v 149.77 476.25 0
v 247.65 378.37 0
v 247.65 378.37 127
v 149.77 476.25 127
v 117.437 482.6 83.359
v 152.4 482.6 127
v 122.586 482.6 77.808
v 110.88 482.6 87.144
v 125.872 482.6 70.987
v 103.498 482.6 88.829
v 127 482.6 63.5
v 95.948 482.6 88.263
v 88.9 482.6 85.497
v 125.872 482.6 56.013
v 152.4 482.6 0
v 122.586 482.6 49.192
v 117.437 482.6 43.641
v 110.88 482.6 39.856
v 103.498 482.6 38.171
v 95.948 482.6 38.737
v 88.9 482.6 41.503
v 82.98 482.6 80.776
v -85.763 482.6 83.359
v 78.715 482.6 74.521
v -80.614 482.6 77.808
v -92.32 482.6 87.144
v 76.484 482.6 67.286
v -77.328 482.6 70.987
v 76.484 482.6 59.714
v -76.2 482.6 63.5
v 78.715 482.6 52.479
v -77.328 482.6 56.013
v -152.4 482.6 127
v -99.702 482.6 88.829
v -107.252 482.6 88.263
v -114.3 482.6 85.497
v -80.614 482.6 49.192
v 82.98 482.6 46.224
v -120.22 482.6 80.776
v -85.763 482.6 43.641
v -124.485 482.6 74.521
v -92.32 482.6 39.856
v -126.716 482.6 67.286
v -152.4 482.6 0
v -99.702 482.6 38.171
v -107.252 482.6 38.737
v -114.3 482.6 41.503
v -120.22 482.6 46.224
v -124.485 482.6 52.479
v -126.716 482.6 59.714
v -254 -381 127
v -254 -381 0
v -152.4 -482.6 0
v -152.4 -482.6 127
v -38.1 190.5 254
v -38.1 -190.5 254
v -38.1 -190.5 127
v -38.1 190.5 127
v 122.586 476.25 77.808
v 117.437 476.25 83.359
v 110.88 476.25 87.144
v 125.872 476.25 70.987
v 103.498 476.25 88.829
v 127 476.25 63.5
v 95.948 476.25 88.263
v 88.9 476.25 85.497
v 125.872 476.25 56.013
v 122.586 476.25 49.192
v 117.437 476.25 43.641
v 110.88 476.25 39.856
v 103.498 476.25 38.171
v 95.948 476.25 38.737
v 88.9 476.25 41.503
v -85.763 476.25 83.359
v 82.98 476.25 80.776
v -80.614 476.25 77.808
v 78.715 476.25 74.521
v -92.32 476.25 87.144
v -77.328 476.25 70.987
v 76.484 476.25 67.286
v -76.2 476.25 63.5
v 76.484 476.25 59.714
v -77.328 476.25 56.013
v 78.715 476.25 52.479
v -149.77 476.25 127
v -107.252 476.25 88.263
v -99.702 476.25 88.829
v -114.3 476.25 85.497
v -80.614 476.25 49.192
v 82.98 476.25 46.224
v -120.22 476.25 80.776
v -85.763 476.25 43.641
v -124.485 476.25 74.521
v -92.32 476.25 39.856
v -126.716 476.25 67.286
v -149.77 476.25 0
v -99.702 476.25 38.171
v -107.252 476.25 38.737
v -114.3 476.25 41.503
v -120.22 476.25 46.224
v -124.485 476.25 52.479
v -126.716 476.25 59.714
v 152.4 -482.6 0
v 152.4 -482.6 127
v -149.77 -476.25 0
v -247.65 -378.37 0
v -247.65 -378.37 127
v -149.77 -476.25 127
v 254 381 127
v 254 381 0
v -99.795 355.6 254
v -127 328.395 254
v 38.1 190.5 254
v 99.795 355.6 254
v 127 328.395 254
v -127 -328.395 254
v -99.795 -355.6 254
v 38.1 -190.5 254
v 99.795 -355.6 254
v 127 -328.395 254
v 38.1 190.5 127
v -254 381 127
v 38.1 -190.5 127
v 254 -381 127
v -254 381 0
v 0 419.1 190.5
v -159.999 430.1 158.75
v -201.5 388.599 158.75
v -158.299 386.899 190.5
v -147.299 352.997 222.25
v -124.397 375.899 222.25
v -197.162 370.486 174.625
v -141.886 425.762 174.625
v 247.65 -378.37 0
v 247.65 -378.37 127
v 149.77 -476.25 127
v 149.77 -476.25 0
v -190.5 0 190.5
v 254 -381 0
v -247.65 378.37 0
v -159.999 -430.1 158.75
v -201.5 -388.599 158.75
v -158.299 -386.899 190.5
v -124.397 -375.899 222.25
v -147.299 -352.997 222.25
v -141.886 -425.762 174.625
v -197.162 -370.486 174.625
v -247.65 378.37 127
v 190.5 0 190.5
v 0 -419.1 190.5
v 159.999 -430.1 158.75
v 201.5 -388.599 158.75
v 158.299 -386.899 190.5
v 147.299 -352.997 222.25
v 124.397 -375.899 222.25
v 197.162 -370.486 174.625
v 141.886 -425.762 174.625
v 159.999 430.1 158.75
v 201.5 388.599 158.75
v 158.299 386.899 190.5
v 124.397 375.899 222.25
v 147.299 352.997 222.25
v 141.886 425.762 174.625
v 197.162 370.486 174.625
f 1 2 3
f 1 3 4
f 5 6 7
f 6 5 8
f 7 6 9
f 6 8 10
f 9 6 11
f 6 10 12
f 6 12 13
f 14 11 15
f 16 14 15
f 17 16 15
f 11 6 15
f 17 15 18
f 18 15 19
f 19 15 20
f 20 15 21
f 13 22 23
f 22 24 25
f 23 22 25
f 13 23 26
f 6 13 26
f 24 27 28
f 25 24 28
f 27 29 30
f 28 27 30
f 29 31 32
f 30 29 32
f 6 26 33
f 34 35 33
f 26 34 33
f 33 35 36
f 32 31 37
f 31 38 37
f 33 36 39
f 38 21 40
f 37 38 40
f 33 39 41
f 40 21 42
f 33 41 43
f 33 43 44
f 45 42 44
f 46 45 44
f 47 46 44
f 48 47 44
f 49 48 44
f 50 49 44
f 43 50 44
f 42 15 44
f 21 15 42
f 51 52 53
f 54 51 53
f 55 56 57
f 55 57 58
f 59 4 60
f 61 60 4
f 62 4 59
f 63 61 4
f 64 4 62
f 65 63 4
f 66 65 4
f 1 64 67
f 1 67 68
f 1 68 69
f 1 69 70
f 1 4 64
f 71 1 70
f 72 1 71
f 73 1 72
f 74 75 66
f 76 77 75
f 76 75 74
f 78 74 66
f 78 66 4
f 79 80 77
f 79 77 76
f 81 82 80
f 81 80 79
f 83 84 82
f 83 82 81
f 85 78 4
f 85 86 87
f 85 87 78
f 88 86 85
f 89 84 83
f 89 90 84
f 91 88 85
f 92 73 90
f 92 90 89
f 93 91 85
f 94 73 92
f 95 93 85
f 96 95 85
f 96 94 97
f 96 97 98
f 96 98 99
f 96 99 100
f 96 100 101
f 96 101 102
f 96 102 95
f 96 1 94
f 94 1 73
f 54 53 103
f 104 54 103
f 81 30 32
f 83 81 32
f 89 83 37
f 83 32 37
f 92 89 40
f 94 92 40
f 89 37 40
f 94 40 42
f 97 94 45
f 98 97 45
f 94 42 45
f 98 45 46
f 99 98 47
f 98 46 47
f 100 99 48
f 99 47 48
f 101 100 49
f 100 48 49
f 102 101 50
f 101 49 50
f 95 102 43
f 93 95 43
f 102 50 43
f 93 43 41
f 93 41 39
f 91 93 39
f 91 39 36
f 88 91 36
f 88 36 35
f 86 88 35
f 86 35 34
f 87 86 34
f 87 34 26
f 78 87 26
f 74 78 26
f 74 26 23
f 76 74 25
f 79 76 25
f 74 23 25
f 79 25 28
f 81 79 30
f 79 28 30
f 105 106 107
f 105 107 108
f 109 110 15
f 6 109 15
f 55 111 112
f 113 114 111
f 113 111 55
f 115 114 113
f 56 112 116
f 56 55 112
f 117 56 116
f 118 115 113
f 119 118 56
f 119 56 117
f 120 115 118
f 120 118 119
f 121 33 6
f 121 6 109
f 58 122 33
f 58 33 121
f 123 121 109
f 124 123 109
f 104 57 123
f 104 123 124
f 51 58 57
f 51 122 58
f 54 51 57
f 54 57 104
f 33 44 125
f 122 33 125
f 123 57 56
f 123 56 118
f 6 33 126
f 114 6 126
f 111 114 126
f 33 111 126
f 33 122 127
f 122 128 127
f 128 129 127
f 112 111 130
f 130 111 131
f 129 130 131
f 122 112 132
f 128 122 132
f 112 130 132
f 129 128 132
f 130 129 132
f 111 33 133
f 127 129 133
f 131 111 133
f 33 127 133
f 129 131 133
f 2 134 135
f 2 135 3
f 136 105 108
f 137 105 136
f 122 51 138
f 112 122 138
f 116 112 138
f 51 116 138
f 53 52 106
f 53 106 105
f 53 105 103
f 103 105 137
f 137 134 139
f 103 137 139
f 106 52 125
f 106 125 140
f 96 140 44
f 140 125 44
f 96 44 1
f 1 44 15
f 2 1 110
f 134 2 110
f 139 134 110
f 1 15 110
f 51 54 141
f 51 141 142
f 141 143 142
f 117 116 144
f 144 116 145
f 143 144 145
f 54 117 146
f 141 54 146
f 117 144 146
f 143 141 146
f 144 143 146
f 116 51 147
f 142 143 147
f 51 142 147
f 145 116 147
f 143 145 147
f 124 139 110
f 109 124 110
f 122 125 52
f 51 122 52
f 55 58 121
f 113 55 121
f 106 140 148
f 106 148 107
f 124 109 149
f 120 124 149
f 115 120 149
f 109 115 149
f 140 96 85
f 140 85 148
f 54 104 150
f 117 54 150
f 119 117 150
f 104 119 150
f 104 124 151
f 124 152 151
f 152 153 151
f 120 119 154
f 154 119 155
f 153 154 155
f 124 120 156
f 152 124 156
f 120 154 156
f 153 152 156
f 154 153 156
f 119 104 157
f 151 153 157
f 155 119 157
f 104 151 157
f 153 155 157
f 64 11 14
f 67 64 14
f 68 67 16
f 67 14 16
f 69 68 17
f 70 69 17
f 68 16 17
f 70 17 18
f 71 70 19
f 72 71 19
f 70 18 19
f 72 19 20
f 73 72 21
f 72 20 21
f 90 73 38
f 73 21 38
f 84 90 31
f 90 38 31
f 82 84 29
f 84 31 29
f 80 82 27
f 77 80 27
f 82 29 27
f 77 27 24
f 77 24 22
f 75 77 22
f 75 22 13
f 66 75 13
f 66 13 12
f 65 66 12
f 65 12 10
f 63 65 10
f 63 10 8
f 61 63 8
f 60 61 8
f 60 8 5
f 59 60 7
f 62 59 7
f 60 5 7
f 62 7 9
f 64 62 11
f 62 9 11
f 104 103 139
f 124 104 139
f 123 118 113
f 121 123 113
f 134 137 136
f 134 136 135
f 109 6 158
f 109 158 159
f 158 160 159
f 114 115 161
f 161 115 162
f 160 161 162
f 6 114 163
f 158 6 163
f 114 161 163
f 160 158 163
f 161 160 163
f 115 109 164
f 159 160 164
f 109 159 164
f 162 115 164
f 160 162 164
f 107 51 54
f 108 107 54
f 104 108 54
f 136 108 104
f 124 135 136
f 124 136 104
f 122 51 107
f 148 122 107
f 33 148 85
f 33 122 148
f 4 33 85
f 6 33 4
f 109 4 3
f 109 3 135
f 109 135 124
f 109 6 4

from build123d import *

# Parameters (mm, degrees)
BOSS_EXTRUDE1_DEPTH = 127
SKETCH5_W           = 76.2
SKETCH5_H           = 381
CUT_EXTRUDE1_DEPTH  = 255
SKETCH6_R           = 25.4
CUT_EXTRUDE2_DEPTH  = 6.35


with BuildPart() as part:
    # Sketch1 → Boss-Extrude1 (new body)
    with BuildSketch(Plane.XY):
        Polygon((-152.4, 482.6), (-254, 381), (-254, -381), (-152.4, -482.6), (152.4, -482.6), (254, -381), (254, 381), (152.4, 482.6), align=None)
        Polygon((-149.769743879, 476.25), (-247.65, 378.369743879), (-247.65, -378.369743879), (-149.769743879, -476.25), (149.769743879, -476.25), (247.65, -378.369743879), (247.65, 378.369743879), (149.769743879, 476.25), align=None, mode=Mode.SUBTRACT)
    extrude(amount=BOSS_EXTRUDE1_DEPTH)

    # Sketch6 → Cut-Extrude2 (cut)
    with BuildSketch(Plane(origin=(0, 482.6, 0), x_dir=(1, 0, 0), z_dir=(0, 1, 0))):
        with Locations((101.6, -63.5)):
            Circle(SKETCH6_R)
        with Locations((-101.6, -63.5)):
            Circle(SKETCH6_R)
    extrude(amount=-CUT_EXTRUDE2_DEPTH, mode=Mode.SUBTRACT)


with BuildPart() as body_2:
    # Sketch3 → Loft3 section 0
    with BuildSketch(Plane.XY.offset(127)):
        Polygon((-152.4, 482.6), (152.4, 482.6), (254, 381), (254, -381), (152.4, -482.6), (-152.4, -482.6), (-254, -381), (-254, 381), align=None)
    # Sketch4 → Loft3 section 1
    with BuildSketch(Plane.XY.offset(254)):
        Polygon((-127, 328.394877579), (-99.794877579, 355.6), (99.794877579, 355.6), (127, 328.394877579), (127, -328.394877579), (99.794877579, -355.6), (-99.794877579, -355.6), (-127, -328.394877579), align=None)
    loft()

    # Sketch5 → Cut-Extrude1 (cut, through all)
    with BuildSketch(Plane.XY.offset(254)):
        Rectangle(SKETCH5_W, SKETCH5_H)
    extrude(amount=-CUT_EXTRUDE1_DEPTH, mode=Mode.SUBTRACT)


solid = Compound([part.part, body_2.part])
